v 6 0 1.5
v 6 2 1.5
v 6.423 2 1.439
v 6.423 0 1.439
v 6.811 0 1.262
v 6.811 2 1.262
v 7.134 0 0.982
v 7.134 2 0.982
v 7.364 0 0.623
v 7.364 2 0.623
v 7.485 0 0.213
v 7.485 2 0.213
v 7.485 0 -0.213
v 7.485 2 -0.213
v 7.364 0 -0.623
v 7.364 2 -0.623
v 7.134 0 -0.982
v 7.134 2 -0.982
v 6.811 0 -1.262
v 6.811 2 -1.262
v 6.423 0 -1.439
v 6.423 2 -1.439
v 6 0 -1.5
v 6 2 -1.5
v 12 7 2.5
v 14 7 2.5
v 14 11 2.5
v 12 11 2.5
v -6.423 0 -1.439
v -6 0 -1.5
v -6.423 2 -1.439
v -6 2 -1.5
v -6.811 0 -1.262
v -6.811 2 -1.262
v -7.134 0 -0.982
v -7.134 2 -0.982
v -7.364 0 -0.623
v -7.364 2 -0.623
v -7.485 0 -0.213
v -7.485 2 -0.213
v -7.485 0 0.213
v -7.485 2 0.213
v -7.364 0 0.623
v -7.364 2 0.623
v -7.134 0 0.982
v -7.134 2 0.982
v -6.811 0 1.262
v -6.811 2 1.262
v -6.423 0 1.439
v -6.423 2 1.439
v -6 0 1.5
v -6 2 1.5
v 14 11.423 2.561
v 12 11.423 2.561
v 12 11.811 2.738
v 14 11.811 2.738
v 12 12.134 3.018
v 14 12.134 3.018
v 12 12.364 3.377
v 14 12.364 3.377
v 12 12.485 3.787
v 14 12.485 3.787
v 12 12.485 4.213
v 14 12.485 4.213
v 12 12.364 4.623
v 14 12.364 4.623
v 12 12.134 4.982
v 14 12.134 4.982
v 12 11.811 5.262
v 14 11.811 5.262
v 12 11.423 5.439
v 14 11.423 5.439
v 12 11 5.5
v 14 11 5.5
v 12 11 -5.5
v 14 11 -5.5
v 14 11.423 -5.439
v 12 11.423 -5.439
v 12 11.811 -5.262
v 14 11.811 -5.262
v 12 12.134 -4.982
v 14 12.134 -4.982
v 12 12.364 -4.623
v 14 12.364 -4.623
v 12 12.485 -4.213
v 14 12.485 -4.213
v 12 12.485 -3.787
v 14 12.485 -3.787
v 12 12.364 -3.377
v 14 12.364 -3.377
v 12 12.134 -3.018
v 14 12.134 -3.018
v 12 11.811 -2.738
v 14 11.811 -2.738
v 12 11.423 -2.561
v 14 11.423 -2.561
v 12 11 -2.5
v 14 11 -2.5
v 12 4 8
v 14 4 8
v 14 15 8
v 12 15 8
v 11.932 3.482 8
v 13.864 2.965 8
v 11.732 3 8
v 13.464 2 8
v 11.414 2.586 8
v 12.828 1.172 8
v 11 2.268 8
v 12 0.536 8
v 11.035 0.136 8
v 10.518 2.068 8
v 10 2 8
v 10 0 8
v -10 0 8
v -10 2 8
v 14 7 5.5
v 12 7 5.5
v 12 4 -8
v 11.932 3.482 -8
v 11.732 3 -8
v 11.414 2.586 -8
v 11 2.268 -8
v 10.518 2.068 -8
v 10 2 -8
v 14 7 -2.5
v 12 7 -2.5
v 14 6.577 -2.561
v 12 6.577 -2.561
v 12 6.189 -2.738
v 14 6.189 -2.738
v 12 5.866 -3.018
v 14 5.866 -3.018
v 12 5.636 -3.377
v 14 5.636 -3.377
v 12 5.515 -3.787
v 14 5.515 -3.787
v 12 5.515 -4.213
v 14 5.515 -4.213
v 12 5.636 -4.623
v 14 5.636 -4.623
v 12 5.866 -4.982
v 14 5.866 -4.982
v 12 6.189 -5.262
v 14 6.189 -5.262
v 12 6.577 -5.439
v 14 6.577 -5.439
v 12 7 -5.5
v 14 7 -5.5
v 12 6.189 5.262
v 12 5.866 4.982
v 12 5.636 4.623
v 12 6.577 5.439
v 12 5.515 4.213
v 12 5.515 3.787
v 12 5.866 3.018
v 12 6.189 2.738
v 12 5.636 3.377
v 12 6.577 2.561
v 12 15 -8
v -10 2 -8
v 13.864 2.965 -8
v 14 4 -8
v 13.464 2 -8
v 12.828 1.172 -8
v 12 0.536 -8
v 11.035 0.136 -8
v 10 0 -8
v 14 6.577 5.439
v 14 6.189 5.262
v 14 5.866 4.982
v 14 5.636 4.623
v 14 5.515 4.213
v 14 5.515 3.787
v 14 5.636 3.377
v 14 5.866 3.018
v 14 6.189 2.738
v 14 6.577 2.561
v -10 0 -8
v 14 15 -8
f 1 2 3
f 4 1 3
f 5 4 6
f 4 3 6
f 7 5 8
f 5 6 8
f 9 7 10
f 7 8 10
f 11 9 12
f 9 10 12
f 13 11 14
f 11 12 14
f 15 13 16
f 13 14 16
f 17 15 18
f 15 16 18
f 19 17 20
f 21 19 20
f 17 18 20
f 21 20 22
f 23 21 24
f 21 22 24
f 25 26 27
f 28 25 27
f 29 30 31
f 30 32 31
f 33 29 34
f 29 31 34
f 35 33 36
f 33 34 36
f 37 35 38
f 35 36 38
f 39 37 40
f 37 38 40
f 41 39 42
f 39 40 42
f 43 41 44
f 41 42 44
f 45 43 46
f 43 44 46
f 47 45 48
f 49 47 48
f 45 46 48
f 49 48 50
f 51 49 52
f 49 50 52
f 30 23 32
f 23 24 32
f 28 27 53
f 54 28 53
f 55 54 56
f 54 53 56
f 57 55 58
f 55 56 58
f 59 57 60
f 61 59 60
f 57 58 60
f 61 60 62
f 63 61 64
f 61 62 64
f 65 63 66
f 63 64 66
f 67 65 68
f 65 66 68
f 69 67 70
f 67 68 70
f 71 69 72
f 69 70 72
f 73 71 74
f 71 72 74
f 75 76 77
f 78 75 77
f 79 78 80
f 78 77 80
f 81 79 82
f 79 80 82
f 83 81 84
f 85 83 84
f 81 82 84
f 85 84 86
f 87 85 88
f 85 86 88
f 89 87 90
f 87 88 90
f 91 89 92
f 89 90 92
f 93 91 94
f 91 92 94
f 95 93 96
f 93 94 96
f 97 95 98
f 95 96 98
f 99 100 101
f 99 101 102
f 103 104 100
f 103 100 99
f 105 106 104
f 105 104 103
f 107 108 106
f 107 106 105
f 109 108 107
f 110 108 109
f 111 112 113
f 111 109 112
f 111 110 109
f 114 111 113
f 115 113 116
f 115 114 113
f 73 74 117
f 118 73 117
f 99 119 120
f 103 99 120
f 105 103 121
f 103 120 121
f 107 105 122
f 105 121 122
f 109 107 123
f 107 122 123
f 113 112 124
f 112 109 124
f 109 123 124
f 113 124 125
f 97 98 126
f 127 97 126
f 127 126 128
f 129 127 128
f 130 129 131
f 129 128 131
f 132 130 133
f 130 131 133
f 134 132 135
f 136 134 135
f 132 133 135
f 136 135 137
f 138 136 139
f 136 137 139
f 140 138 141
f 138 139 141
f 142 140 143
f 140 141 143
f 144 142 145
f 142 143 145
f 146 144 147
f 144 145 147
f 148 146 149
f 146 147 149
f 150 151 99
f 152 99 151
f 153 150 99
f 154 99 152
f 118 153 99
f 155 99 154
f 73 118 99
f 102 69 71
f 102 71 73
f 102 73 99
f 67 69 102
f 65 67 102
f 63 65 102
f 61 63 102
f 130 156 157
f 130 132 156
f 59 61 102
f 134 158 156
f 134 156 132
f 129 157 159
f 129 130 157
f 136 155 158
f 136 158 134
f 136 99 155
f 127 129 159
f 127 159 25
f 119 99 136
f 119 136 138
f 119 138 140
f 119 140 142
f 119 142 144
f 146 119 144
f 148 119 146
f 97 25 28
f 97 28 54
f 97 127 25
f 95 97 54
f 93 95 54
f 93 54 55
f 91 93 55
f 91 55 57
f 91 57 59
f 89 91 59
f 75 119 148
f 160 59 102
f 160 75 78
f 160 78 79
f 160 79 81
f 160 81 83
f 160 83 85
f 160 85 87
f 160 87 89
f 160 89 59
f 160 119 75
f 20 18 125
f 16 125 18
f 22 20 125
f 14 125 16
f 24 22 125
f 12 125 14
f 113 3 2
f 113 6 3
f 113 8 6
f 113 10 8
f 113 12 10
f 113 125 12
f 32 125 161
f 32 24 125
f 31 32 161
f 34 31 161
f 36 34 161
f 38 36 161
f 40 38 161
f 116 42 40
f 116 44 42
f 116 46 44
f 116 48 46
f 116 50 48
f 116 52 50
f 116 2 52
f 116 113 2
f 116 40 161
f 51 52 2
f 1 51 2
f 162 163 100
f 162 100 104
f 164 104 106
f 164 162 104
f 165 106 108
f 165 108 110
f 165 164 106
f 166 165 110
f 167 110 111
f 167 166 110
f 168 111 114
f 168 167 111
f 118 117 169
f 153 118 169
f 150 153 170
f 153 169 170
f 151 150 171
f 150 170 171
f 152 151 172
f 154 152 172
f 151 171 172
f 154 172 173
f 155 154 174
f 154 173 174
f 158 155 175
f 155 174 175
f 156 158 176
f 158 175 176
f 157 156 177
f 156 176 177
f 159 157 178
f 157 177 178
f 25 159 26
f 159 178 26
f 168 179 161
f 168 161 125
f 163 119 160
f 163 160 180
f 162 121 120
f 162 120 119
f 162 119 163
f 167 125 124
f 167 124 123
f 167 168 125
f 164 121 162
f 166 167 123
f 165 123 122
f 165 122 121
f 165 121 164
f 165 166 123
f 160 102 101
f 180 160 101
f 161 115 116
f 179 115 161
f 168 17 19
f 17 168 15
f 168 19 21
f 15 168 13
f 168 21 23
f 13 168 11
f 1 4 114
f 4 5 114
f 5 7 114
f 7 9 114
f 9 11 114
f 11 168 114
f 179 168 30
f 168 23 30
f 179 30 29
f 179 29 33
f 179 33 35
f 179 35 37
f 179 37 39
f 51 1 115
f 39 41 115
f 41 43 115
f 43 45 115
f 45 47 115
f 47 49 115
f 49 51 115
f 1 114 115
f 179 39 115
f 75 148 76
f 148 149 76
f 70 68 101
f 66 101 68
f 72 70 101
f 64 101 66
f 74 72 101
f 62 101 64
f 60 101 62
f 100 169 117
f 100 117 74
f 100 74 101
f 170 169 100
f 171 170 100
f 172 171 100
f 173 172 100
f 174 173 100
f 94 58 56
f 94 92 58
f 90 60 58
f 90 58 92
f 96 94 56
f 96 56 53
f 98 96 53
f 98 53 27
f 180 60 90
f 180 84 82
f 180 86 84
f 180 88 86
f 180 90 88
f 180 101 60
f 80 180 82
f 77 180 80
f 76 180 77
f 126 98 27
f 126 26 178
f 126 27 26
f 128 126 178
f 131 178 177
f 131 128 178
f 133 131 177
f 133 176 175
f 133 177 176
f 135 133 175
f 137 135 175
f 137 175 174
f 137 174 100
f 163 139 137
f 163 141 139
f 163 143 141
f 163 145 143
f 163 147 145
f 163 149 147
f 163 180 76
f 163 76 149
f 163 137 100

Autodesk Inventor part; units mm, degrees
ref_plane "YZ Plane" through (0, 0, 0) normal (1, 0, 0) x (0, 1, 0)
ref_plane "XZ Plane" through (0, 0, 0) normal (0, 1, 0) x (-1, 0, 0)
ref_plane "XY Plane" through (0, 0, 0) normal (0, 0, 1) x (1, 0, 0)
sketch "スケッチ1" plane through (0, 0, 0) normal (0, 1, 0) x (-1, 0, 0)
  line L0 (-10, 8) -> (10, 8)
  line L1 (10, 8) -> (10, -8)
  line L2 (10, -8) -> (-10, -8)
  line L3 (-10, -8) -> (-10, 8)
  line L4 (-10, 8) -> (10, -8) construction
  line L5 (10, 8) -> (-10, -8) construction
  point P0 (0, 0)
  dimension "d0" = 20
  dimension "d1" = 16
extrude "プレート1" add sketch "スケッチ1" along normal blind 2
sketch "スケッチ2" plane through (12, 4, -8) normal (1, 0, 0) x (0, 1, 0)
  line L0 (0, 16) -> (0, 0)
  line L1 (0, 0) -> (11, 0)
  line L2 (11, 0) -> (11, 16)
  line L3 (11, 16) -> (0, 16)
edge flange "フランジ1" height 15 angle 90 thickness 2 bend radius 2 thickness toward (1, 0, 0) relief tear relief width 2 relief depth 1 edges at (10, 2, 0) wall of the first edge with corners at (12, 4, 8) (12, 4, -8) (12, 15, -8) (12, 15, 8)
bend "曲げ1"
corner "コーナー1"
sketch "スケッチ3" plane through (14, 15, 8) normal (1, 0, 0) x (0, 0, -1)
  line L0 (2.5, -4) -> (2.5, -8)
  arc A0 (2.5, -8) -> (5.5, -8) centre (4, -8) ccw
  line L1 (5.5, -8) -> (5.5, -4)
  arc A1 (5.5, -4) -> (2.5, -4) centre (4, -4) ccw
  line L2 (10.5, -4) -> (10.5, -8)
  arc A2 (10.5, -8) -> (13.5, -8) centre (12, -8) ccw
  line L3 (13.5, -8) -> (13.5, -4)
  arc A3 (13.5, -4) -> (10.5, -4) centre (12, -4) ccw
  line L4 (0, -11) -> (0, 0) projected
  line L5 (16, 0) -> (16, -11) projected
  line L6 (0, 0) -> (16, 0) projected
  line L7 (0, -11) -> (16, -11) projected
  point P0 (8, -15)
  dimension "d13" = 4
  dimension "d14" = 4
  dimension "d17" = 3
  dimension "d18" = 4
  dimension "d19" = 1.5
  dimension "d20" = 1.5
extrude "押し出し1" cut sketch "スケッチ3" against normal blind 10 contours A1 L1 A0 L0 | A3 L3 A2 L2
sketch "スケッチ4" plane through (0, 2, 0) normal (0, 1, 0) x (1, 0, 0)
  line L0 (-6, -1.5) -> (6, -1.5)
  arc A0 (6, -1.5) -> (6, 1.5) centre (6, 0) ccw
  line L1 (6, 1.5) -> (-6, 1.5)
  arc A1 (-6, 1.5) -> (-6, -1.5) centre (-6, 0) ccw
  line L2 (-10, -8) -> (-10, 8) projected
  line L3 (10, 8) -> (10, -8) projected
  point P0 (0, 0)
  dimension "d23" = 4
  dimension "d24" = 4
  dimension "d25" = 1.5
extrude "押し出し2" cut sketch "スケッチ4" against normal blind 10
equation "\"d2\" = Thickness"
equation "\"d3\" = BendReliefWidth"
equation "\"d4\" = BendReliefDepth"
equation "\"d5\" = MinimumRemnant"
equation "\"d6\" = TransitionRadius"
equation "\"d9\" = BendRadius"
equation "\"d10\" = CornerReliefSize"
equation "\"d11\" = GapSize"
equation "\"d12\" = JacobiRadiusSize"
equation "\"BendRadius\" = Thickness"
equation "\"BendReliefWidth\" = Thickness"
equation "\"BendReliefDepth\" = 0.5 * Thickness"
equation "\"CornerReliefSize\" = 4 * Thickness"
equation "\"MinimumRemnant\" = 2 * Thickness"
equation "\"TransitionRadius\" = BendRadius"
equation "\"JacobiRadiusSize\" = BendRadius"
equation "\"GapSize\" = Thickness"
equation "\"Thickness\" = 2"
properties part number "keyL_small" material "アルミニウム 6061"
